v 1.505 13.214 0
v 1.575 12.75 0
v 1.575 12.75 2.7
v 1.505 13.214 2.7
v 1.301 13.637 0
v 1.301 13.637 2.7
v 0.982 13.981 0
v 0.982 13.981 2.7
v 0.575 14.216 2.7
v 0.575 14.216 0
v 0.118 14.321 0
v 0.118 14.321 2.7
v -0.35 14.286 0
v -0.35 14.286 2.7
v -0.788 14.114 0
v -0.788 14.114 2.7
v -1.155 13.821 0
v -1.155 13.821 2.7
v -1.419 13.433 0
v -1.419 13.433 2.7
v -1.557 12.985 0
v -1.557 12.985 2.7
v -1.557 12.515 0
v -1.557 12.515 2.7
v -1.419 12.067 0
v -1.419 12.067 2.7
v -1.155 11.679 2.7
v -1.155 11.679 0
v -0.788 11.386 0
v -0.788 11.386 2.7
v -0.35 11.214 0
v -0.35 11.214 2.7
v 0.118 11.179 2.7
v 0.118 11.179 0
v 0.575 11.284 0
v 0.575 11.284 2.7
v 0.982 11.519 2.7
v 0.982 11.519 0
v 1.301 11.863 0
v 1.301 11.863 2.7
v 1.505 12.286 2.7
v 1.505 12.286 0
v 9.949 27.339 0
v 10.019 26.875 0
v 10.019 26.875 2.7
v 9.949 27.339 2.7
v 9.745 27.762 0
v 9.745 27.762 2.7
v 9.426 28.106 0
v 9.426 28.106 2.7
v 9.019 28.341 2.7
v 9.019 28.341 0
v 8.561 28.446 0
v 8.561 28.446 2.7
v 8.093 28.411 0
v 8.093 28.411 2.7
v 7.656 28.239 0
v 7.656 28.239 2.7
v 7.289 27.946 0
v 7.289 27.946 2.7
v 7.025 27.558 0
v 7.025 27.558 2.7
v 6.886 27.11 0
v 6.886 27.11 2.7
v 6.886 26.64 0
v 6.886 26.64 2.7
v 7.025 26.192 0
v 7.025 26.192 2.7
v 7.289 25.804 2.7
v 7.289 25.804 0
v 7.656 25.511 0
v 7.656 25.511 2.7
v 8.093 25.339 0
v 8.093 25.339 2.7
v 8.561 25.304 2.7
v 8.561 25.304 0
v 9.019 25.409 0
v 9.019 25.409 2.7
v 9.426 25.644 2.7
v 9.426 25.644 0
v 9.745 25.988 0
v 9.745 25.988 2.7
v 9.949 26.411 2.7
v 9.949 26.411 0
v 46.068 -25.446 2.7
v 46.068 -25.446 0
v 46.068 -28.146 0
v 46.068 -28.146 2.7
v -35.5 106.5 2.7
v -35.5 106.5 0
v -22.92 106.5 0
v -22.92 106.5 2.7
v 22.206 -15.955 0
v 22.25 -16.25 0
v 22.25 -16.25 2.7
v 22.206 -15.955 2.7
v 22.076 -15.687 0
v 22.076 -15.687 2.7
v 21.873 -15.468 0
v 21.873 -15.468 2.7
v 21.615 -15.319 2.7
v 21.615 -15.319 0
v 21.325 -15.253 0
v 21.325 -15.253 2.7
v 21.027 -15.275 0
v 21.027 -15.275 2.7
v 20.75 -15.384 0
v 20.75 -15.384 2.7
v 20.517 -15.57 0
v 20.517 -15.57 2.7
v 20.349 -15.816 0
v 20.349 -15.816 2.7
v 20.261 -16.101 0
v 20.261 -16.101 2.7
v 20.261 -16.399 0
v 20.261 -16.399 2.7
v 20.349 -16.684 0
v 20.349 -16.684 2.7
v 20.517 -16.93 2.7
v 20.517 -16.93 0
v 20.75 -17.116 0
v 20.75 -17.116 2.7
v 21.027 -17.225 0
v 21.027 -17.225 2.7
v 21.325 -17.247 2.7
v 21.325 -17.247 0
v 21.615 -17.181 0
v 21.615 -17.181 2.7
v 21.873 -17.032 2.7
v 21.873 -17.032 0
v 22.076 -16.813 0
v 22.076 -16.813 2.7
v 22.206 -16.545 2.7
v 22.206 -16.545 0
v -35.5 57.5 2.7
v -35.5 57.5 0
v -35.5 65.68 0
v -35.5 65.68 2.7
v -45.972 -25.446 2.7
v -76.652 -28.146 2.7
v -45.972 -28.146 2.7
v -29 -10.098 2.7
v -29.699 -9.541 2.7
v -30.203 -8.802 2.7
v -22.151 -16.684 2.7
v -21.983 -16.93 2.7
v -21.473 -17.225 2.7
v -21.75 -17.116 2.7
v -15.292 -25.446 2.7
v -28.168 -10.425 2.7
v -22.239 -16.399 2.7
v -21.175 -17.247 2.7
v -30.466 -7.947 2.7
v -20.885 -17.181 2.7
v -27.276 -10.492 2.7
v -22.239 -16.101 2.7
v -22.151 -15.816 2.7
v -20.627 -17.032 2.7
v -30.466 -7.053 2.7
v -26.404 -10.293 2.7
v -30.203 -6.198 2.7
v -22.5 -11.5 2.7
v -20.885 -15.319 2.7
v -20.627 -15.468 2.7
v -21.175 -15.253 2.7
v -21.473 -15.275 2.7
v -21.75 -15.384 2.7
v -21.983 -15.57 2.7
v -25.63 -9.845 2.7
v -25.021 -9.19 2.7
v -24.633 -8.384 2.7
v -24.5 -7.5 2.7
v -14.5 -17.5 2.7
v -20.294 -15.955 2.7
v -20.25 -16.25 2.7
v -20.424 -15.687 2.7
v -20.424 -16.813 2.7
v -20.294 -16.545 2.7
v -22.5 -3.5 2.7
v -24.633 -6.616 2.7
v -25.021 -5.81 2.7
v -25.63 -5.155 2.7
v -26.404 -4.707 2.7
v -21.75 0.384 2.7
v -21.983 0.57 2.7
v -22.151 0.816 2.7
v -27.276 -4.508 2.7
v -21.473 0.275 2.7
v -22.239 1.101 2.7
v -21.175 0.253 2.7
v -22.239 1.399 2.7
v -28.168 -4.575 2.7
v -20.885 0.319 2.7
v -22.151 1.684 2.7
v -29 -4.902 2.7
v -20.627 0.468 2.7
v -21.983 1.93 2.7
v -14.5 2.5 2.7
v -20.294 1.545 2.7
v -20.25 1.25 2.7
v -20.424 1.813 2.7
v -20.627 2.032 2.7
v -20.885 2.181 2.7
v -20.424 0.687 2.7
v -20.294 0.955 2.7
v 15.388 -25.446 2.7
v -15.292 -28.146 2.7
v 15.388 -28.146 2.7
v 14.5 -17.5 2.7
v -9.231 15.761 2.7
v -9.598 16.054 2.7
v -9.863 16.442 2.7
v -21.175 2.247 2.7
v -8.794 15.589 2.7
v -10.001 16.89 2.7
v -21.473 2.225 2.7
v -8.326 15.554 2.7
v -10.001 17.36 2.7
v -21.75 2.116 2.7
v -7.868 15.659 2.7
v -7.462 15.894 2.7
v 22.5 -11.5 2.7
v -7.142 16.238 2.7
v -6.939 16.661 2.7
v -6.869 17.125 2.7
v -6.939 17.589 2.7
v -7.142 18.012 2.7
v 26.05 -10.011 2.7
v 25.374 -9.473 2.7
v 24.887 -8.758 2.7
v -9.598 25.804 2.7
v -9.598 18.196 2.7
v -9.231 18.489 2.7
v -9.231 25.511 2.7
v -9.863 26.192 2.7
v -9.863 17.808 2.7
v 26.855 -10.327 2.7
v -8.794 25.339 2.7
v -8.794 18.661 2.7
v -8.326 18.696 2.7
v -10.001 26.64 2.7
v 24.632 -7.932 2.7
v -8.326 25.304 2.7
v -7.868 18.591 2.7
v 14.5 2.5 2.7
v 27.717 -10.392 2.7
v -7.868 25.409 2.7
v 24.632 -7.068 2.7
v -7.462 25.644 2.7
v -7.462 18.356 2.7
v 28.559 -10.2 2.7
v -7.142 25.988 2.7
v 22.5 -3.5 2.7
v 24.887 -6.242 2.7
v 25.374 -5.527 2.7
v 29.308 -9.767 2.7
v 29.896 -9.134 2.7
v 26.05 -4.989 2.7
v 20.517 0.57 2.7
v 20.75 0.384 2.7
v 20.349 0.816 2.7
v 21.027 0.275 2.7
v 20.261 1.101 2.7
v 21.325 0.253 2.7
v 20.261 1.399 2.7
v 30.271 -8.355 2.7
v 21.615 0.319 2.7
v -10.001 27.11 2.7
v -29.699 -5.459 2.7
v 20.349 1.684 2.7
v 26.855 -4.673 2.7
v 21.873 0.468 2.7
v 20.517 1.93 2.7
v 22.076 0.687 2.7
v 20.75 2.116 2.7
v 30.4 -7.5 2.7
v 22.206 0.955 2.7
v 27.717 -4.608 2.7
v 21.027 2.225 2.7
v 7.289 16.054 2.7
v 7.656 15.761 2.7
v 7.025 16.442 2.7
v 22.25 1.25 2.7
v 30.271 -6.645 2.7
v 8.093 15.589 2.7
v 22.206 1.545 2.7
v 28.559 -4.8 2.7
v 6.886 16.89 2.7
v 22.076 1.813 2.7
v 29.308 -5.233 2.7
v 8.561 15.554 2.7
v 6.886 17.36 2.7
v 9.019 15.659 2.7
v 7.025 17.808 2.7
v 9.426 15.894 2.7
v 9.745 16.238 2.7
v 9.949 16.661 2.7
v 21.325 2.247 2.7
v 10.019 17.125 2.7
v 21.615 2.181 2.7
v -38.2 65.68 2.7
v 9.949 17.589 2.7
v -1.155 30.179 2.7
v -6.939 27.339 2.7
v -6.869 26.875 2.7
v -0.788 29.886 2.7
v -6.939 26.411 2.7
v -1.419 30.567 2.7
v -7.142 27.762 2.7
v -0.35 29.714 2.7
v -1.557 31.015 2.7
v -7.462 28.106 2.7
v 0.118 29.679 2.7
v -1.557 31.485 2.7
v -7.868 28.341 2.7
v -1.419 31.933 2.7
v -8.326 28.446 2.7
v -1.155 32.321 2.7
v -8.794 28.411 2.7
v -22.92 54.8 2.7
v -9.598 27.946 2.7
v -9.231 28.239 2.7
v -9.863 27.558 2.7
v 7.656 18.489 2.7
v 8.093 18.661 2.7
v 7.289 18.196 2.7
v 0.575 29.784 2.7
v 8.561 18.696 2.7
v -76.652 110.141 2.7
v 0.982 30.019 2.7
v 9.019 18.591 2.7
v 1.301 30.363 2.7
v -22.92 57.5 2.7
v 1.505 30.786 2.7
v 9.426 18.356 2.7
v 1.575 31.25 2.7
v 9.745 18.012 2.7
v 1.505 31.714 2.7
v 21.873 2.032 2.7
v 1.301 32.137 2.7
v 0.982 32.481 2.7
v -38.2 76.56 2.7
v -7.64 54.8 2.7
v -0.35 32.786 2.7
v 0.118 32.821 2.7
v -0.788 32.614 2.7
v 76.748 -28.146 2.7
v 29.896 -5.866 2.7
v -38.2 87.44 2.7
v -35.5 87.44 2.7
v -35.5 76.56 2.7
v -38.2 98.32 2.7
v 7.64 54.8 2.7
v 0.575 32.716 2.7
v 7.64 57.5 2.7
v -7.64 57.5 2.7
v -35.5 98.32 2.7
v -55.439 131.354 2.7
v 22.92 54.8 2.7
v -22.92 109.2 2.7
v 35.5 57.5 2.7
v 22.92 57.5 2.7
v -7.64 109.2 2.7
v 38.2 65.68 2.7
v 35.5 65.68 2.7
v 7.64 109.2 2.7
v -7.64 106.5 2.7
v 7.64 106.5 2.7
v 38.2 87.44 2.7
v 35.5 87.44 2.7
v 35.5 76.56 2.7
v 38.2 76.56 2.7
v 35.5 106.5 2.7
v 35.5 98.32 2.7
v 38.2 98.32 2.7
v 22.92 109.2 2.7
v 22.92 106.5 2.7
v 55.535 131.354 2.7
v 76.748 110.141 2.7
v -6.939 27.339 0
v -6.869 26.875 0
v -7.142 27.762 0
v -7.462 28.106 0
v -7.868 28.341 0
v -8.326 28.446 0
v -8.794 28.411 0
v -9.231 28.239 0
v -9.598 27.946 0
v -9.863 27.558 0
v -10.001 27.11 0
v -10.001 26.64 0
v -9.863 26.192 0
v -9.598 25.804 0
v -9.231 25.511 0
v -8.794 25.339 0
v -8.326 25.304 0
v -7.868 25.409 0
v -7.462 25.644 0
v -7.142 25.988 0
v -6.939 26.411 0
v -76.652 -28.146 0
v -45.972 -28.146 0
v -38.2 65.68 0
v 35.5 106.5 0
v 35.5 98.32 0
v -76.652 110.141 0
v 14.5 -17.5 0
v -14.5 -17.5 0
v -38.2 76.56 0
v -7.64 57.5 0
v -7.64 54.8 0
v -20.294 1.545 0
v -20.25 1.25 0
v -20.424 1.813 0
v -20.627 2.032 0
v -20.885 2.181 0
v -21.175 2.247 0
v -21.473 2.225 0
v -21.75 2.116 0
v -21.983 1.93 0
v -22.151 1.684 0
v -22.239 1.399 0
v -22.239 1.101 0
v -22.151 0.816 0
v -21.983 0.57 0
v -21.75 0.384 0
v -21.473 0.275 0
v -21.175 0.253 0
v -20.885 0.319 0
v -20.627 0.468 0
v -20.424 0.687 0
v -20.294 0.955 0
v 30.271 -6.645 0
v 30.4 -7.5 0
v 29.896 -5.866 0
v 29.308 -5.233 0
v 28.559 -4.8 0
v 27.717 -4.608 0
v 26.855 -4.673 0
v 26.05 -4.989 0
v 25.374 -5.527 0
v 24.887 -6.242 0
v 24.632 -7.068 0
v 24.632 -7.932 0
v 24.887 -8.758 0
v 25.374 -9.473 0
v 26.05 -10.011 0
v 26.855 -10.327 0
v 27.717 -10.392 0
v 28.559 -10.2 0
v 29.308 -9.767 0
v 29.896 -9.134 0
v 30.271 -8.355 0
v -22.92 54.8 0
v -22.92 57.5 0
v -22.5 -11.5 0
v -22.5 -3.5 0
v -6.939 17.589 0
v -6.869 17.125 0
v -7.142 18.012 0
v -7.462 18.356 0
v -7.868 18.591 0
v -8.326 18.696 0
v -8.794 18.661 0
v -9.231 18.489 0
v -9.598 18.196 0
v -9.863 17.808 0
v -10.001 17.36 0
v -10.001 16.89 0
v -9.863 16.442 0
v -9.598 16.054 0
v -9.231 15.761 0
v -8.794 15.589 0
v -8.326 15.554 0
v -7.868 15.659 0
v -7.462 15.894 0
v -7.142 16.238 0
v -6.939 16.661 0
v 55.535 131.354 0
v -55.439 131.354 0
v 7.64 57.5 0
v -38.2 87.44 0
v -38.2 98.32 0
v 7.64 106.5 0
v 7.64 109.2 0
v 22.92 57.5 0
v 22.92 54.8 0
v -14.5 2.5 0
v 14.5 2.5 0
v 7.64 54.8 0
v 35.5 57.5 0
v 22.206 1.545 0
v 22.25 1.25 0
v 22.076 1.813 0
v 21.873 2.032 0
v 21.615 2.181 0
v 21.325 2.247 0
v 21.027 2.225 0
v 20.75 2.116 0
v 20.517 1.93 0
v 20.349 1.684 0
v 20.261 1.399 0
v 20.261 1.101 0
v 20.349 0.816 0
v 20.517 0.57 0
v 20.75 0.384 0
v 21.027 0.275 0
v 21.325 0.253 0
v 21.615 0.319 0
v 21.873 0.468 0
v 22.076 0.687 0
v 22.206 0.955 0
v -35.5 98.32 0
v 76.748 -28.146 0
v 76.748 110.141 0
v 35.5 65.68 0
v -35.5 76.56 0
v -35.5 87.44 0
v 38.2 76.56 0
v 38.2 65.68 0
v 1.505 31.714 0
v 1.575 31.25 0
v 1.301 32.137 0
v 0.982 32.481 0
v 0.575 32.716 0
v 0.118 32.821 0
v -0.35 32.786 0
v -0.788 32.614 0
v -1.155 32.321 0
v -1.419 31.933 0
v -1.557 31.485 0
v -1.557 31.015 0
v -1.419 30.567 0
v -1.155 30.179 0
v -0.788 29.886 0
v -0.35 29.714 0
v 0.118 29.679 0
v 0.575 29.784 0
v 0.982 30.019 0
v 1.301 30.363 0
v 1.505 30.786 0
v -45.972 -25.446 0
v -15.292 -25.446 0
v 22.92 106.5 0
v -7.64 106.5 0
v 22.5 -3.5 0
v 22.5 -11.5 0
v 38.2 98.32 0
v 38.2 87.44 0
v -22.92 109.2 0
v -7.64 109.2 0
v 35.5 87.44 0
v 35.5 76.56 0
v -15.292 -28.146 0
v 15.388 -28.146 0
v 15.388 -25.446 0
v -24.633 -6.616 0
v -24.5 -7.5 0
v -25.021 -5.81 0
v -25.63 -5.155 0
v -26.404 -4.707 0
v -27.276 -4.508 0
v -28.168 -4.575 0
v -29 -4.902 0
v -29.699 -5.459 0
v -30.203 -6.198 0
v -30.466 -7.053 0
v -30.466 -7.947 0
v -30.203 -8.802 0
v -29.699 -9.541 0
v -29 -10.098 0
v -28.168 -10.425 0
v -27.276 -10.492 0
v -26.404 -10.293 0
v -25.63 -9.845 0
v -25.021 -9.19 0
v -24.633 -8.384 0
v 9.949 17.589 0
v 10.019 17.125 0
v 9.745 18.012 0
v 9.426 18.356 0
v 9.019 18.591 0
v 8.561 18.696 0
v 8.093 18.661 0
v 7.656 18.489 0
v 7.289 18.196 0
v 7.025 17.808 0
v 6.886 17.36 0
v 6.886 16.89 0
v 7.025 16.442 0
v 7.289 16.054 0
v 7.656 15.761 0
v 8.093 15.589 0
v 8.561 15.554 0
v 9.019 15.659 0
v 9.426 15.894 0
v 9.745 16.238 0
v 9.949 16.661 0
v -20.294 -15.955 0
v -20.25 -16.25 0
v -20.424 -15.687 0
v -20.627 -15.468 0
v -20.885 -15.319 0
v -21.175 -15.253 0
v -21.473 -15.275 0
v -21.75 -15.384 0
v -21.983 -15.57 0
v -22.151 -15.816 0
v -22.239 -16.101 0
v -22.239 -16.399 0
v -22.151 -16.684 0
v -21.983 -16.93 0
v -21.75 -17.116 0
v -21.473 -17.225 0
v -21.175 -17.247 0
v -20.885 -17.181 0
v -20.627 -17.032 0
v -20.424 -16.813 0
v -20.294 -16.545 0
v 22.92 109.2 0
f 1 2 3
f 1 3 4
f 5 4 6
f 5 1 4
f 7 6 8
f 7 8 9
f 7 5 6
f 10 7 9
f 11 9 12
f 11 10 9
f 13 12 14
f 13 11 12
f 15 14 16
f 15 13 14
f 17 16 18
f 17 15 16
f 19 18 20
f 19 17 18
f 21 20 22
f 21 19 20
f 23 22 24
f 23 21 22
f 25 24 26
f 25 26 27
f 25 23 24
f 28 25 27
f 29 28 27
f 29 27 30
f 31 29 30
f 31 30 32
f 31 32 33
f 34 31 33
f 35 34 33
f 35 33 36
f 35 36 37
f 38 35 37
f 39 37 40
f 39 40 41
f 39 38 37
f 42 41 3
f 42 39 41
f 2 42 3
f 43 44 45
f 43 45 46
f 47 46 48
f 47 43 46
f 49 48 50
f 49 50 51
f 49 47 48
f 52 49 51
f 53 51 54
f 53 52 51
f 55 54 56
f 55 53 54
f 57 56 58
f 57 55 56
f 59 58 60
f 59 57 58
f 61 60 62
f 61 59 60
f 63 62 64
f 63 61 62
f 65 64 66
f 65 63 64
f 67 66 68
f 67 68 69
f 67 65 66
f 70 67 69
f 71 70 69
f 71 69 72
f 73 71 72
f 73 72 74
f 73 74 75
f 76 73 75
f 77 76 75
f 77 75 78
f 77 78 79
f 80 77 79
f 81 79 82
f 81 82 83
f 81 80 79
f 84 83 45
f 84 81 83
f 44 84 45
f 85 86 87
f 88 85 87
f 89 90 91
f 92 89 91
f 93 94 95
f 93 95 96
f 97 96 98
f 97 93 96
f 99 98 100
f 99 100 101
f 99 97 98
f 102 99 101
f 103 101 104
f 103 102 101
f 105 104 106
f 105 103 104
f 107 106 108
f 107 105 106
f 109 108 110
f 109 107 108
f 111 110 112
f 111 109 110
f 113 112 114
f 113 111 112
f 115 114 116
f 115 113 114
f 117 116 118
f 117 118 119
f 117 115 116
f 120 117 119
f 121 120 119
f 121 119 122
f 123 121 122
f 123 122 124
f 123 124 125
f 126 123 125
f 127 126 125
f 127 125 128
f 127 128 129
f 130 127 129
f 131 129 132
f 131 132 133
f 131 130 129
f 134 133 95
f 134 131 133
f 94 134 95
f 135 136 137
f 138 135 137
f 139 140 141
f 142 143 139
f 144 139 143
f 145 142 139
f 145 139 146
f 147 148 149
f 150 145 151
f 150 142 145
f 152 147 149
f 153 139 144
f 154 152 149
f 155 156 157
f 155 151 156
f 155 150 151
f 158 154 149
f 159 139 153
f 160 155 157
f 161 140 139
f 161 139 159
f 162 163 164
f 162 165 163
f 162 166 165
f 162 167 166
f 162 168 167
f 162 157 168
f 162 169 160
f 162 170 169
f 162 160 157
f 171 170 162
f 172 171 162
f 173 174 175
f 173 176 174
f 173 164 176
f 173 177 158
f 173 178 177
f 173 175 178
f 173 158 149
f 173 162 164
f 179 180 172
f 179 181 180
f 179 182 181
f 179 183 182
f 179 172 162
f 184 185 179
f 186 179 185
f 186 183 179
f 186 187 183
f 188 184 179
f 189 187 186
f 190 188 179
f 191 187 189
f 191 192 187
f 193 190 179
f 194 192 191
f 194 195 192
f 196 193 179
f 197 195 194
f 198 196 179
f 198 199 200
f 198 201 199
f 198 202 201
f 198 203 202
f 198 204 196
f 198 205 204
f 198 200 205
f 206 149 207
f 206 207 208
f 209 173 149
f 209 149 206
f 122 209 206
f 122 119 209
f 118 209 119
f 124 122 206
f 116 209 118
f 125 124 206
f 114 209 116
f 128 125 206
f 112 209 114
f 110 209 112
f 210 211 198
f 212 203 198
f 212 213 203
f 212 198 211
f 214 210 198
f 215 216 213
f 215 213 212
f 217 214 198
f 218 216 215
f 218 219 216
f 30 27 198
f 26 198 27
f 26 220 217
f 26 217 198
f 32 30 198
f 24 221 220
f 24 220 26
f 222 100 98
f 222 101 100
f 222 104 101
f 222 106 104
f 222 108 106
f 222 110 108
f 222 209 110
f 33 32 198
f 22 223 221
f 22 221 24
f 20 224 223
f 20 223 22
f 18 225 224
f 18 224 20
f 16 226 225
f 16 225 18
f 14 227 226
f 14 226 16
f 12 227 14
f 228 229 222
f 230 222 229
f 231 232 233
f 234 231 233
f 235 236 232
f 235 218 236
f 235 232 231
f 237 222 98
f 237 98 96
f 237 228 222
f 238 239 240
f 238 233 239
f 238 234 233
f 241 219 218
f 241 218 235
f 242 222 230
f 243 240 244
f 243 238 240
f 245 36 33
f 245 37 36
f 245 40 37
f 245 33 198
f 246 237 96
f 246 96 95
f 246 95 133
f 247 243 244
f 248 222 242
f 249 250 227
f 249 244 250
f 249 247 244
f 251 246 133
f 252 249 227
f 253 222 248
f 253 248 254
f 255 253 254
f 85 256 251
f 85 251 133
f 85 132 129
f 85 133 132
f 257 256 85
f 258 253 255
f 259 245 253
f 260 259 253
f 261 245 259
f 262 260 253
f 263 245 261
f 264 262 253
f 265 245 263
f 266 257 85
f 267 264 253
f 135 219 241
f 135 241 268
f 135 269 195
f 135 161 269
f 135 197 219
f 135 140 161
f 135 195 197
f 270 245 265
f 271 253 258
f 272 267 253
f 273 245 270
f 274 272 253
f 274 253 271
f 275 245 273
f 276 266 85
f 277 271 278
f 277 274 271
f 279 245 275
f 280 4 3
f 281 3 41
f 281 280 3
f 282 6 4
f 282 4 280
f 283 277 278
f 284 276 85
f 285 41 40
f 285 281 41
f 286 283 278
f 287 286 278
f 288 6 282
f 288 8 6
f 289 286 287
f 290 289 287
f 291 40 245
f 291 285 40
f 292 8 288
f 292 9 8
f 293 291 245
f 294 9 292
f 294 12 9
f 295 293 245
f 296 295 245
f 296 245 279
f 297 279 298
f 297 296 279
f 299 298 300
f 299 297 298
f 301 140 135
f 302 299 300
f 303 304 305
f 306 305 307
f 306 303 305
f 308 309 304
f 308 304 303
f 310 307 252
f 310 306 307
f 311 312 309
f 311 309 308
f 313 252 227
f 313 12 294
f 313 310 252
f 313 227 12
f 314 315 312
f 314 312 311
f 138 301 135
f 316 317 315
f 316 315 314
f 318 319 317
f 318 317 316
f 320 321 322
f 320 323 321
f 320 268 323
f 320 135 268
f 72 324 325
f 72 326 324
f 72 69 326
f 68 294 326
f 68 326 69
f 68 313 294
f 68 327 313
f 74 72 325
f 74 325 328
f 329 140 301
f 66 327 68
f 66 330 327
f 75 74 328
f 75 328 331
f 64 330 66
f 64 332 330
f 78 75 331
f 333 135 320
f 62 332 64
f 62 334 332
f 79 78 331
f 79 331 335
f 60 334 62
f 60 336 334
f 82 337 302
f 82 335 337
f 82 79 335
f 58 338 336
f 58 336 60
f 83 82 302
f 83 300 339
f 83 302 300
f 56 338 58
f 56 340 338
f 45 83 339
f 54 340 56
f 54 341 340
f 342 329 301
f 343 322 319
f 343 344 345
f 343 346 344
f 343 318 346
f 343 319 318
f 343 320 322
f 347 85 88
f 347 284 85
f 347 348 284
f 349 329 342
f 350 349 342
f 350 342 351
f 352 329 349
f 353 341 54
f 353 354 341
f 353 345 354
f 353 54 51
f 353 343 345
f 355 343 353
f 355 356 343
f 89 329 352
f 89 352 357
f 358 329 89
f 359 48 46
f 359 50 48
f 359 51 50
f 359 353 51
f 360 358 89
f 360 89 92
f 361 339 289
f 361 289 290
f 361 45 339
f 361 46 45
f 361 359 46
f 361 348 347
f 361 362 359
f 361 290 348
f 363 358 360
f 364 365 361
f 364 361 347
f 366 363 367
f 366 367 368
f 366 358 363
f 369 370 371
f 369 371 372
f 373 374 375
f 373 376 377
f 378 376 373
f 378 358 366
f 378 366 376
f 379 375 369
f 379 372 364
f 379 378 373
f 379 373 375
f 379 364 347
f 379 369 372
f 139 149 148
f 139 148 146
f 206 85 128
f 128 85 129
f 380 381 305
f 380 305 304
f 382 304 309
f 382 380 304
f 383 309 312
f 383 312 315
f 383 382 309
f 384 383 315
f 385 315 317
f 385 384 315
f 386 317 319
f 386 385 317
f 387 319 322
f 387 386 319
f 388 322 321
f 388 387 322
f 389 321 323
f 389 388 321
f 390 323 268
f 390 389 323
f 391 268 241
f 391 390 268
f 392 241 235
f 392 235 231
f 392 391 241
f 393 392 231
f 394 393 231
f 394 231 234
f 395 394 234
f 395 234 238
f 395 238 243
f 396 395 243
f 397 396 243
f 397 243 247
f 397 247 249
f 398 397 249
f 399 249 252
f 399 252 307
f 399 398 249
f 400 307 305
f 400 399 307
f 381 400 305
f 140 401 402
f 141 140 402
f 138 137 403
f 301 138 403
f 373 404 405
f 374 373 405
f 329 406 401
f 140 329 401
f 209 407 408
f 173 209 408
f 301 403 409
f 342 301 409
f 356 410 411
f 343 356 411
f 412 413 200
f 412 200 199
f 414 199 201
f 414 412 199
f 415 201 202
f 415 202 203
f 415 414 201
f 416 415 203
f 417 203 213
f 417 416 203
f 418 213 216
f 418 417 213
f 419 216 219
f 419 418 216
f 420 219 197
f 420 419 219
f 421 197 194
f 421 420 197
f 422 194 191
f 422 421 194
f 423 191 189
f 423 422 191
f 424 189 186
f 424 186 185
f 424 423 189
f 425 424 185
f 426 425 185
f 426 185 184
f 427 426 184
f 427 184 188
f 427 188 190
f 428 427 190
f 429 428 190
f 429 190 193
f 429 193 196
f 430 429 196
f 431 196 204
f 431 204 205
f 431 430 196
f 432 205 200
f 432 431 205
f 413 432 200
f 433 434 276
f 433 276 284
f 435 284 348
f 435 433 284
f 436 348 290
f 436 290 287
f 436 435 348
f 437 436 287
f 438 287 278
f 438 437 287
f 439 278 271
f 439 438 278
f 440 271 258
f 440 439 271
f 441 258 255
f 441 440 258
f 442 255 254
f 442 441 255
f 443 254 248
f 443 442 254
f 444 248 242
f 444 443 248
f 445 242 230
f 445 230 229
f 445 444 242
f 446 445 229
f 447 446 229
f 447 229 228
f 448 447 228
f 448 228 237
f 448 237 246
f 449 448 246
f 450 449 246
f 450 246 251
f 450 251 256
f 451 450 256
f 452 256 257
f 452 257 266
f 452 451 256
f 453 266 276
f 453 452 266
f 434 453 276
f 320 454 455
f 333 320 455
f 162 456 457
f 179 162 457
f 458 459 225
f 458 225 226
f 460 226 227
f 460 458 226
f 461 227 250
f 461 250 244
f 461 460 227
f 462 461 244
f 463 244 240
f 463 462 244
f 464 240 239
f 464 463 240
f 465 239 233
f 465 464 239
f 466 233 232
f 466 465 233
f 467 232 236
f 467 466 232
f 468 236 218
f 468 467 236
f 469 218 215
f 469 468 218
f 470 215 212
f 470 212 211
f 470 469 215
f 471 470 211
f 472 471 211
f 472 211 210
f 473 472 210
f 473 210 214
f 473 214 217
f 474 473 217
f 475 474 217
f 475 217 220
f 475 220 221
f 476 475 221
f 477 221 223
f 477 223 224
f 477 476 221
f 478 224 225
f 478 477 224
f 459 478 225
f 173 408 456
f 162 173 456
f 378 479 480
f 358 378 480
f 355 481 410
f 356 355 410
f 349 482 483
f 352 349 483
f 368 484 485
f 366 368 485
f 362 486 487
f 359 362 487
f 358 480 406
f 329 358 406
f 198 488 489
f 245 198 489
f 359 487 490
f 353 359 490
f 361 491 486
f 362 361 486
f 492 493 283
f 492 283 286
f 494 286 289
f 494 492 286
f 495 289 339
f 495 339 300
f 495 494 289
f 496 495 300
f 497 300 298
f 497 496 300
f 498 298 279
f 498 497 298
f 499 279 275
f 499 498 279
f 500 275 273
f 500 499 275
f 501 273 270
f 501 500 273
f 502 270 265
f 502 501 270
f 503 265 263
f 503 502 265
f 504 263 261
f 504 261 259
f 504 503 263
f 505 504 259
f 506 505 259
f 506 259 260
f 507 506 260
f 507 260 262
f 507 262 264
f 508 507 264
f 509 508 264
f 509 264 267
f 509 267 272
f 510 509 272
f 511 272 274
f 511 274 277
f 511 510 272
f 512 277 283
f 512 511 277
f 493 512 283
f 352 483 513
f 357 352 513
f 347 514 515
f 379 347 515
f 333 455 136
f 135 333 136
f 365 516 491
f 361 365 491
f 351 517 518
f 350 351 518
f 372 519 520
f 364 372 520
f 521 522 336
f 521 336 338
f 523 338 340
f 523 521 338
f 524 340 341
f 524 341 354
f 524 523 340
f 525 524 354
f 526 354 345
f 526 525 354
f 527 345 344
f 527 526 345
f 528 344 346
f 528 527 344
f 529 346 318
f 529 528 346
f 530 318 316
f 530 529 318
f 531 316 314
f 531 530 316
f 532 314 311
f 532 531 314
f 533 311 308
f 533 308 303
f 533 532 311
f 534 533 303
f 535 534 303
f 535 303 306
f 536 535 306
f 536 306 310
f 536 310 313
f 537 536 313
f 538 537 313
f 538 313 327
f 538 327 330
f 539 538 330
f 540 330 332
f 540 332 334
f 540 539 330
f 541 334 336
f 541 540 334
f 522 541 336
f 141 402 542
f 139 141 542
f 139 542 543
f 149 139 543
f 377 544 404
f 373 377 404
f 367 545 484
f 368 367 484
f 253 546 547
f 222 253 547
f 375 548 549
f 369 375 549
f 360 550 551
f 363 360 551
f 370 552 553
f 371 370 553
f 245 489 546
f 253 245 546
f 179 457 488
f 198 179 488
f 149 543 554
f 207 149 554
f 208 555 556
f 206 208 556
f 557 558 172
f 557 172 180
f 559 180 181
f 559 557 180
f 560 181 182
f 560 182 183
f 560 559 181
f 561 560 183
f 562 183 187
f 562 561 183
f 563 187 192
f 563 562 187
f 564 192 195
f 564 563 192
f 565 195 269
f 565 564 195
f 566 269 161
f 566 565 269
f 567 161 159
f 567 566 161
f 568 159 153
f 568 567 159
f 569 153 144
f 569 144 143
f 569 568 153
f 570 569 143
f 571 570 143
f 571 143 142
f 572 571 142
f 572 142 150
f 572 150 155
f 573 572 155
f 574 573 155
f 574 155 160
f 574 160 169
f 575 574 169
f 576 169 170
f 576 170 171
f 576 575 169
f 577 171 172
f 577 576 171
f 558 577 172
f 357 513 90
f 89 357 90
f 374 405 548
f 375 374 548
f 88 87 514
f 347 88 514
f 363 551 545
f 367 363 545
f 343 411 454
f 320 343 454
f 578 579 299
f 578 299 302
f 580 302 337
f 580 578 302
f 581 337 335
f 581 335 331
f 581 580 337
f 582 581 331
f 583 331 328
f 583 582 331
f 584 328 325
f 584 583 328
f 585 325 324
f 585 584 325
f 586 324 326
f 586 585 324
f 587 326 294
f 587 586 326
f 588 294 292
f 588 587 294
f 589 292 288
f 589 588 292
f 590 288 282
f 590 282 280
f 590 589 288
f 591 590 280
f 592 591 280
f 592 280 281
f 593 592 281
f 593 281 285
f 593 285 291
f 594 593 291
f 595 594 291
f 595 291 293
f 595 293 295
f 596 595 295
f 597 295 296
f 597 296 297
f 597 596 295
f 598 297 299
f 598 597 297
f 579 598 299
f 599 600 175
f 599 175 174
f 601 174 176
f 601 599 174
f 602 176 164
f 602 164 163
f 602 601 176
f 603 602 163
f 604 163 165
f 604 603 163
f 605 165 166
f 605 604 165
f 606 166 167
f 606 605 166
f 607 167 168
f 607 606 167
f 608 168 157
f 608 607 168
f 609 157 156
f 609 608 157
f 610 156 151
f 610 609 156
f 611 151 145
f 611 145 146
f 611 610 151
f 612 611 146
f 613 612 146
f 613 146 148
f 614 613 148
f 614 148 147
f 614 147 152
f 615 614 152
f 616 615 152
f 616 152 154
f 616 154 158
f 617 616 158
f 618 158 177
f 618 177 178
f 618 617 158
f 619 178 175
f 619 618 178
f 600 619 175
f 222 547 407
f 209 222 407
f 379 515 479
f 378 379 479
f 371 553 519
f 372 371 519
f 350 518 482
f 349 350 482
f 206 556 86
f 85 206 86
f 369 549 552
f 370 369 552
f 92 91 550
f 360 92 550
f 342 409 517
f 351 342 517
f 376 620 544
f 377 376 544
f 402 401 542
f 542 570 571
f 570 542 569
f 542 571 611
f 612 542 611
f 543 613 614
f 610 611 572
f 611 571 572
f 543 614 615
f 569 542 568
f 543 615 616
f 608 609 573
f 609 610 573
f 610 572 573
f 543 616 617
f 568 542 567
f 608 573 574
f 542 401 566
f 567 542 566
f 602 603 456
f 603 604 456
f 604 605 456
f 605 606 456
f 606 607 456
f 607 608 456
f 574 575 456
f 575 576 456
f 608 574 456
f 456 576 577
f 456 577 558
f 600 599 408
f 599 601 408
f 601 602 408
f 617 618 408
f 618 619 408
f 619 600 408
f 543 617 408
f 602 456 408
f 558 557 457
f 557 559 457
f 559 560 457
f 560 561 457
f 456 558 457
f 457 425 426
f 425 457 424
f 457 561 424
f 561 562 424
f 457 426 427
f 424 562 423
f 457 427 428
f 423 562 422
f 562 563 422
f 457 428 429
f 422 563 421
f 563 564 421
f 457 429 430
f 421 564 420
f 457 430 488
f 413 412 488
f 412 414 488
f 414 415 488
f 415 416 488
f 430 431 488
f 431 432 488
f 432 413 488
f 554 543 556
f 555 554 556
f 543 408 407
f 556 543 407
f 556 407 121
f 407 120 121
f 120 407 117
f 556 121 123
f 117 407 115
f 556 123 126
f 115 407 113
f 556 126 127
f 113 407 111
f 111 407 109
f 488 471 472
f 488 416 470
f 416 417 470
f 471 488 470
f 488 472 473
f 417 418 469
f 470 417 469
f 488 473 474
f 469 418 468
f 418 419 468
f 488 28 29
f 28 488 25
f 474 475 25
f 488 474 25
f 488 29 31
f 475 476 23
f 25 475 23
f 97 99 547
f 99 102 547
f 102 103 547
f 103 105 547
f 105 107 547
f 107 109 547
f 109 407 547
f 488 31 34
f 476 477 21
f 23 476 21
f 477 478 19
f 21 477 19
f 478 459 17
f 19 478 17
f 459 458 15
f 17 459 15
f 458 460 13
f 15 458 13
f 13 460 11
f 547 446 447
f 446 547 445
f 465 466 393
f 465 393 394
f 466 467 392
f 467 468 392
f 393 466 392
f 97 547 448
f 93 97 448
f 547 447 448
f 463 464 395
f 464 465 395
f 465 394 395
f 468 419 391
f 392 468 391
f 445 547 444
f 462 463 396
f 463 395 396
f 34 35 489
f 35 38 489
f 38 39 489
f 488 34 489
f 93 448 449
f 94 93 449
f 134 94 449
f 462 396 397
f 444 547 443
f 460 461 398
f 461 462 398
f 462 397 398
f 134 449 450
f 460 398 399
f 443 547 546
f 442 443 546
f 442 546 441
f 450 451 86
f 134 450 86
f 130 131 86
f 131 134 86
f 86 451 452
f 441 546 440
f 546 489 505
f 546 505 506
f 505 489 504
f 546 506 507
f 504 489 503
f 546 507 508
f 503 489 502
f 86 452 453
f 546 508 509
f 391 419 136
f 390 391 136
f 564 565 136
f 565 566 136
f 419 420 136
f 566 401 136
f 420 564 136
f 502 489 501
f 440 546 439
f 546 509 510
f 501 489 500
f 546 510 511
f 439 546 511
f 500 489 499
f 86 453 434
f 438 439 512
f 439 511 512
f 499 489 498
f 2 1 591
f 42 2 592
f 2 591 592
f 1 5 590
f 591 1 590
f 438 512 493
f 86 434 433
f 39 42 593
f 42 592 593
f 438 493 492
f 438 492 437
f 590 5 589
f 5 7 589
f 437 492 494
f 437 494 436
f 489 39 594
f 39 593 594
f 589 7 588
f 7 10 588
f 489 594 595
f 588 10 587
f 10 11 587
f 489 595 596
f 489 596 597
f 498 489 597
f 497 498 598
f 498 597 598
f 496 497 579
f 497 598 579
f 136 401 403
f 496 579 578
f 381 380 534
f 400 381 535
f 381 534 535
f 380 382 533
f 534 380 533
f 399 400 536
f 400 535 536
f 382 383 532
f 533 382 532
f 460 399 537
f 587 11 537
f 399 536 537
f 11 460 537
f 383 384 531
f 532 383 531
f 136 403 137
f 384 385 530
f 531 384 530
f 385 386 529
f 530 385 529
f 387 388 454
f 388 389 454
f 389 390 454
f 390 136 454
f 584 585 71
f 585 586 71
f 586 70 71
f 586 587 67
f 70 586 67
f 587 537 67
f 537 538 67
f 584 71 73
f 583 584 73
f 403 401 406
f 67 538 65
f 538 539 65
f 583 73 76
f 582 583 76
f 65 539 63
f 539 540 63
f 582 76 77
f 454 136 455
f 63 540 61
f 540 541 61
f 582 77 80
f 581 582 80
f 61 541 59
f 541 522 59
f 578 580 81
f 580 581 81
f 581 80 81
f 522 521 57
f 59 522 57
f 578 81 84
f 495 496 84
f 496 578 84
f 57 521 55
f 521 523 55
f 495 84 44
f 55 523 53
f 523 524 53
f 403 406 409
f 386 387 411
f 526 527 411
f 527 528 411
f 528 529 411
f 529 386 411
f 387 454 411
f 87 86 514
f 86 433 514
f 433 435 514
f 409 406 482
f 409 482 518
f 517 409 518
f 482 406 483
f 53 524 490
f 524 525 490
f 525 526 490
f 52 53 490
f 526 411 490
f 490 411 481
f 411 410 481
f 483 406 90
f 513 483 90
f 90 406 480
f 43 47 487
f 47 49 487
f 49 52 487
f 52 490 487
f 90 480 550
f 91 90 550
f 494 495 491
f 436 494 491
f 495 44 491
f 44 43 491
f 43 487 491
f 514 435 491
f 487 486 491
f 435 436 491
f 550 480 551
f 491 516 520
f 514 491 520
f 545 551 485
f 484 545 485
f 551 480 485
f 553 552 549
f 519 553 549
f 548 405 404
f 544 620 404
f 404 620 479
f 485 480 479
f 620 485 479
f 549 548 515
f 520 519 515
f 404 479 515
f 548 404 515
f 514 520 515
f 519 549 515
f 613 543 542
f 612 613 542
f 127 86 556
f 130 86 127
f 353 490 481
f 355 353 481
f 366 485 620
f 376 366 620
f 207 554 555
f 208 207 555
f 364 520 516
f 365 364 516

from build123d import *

# Parameters (mm, degrees)
SKETCH1_R           = 1
SKETCH1_R_2         = 3
SKETCH1_R_3         = 2.9
SKETCH1_R_4         = 1.575
BOSS_EXTRUDE3_DEPTH = 2.7


with BuildPart() as part:
    # Sketch1 → Boss-Extrude3 (new body)
    with BuildSketch(Plane.XY):
        Polygon((-45.972294428, -28.145904304), (-45.972294428, -25.445904304), (-15.292294428, -25.445904304), (-15.292294428, -28.145904304), (15.387705572, -28.145904304), (15.387705572, -25.445904304), (46.067705572, -25.445904304), (46.067705572, -28.145904304), (76.747705572, -28.145904304), (76.747705572, -25.445904304), (76.747705572, -23.145904304), (76.747705572, 12.854095696), (76.747705572, 110.140892261), (55.534502136, 131.354095696), (-55.439090993, 131.354095696), (-76.652294428, 110.140892261), (-76.652294428, 12.854095696), (-76.652294428, -23.145904304), (-76.652294428, -25.445904304), (-76.652294428, -28.145904304), align=None)
        with Locations((-21.25, -16.25)):
            Circle(SKETCH1_R, mode=Mode.SUBTRACT)
        with Locations((-27.5, -7.5)):
            Circle(SKETCH1_R_2, mode=Mode.SUBTRACT)
        with Locations((-21.25, 1.25)):
            Circle(SKETCH1_R, mode=Mode.SUBTRACT)
        with Locations((21.25, -16.25)):
            Circle(SKETCH1_R, mode=Mode.SUBTRACT)
        with Locations((27.5, -7.5)):
            Circle(SKETCH1_R_3, mode=Mode.SUBTRACT)
        with Locations((21.25, 1.25)):
            Circle(SKETCH1_R, mode=Mode.SUBTRACT)
        with Locations((0, 31.25)):
            Circle(SKETCH1_R_4, mode=Mode.SUBTRACT)
        with Locations((0, 12.75)):
            Circle(SKETCH1_R_4, mode=Mode.SUBTRACT)
        with Locations((-8.443747687, 17.125)):
            Circle(SKETCH1_R_4, mode=Mode.SUBTRACT)
        with Locations((-8.443747687, 26.875)):
            Circle(SKETCH1_R_4, mode=Mode.SUBTRACT)
        with Locations((8.443747687, 26.875)):
            Circle(SKETCH1_R_4, mode=Mode.SUBTRACT)
        with Locations((8.443747687, 17.125)):
            Circle(SKETCH1_R_4, mode=Mode.SUBTRACT)
        Polygon((-22.5, -3.5), (-14.5, 2.5), (14.5, 2.5), (22.5, -3.5), (22.5, -11.5), (14.5, -17.5), (0, -17.5), (-14.5, -17.5), (-22.5, -11.5), align=None, mode=Mode.SUBTRACT)
        Polygon((35.5, 57.5), (22.92, 57.5), (22.92, 54.8), (7.64, 54.8), (7.64, 57.5), (-7.64, 57.5), (-7.64, 54.8), (-22.92, 54.8), (-22.92, 57.5), (-35.5, 57.5), (-35.5, 65.68), (-38.2, 65.68), (-38.2, 76.56), (-35.5, 76.56), (-35.5, 87.44), (-38.2, 87.44), (-38.2, 98.32), (-35.5, 98.32), (-35.5, 106.5), (-22.92, 106.5), (-22.92, 109.2), (-7.64, 109.2), (-7.64, 106.5), (7.64, 106.5), (7.64, 109.2), (22.92, 109.2), (22.92, 106.5), (35.5, 106.5), (35.5, 98.32), (38.2, 98.32), (38.2, 87.44), (35.5, 87.44), (35.5, 76.56), (38.2, 76.56), (38.2, 65.68), (35.5, 65.68), align=None, mode=Mode.SUBTRACT)
    extrude(amount=BOSS_EXTRUDE3_DEPTH)


solid = part.part
